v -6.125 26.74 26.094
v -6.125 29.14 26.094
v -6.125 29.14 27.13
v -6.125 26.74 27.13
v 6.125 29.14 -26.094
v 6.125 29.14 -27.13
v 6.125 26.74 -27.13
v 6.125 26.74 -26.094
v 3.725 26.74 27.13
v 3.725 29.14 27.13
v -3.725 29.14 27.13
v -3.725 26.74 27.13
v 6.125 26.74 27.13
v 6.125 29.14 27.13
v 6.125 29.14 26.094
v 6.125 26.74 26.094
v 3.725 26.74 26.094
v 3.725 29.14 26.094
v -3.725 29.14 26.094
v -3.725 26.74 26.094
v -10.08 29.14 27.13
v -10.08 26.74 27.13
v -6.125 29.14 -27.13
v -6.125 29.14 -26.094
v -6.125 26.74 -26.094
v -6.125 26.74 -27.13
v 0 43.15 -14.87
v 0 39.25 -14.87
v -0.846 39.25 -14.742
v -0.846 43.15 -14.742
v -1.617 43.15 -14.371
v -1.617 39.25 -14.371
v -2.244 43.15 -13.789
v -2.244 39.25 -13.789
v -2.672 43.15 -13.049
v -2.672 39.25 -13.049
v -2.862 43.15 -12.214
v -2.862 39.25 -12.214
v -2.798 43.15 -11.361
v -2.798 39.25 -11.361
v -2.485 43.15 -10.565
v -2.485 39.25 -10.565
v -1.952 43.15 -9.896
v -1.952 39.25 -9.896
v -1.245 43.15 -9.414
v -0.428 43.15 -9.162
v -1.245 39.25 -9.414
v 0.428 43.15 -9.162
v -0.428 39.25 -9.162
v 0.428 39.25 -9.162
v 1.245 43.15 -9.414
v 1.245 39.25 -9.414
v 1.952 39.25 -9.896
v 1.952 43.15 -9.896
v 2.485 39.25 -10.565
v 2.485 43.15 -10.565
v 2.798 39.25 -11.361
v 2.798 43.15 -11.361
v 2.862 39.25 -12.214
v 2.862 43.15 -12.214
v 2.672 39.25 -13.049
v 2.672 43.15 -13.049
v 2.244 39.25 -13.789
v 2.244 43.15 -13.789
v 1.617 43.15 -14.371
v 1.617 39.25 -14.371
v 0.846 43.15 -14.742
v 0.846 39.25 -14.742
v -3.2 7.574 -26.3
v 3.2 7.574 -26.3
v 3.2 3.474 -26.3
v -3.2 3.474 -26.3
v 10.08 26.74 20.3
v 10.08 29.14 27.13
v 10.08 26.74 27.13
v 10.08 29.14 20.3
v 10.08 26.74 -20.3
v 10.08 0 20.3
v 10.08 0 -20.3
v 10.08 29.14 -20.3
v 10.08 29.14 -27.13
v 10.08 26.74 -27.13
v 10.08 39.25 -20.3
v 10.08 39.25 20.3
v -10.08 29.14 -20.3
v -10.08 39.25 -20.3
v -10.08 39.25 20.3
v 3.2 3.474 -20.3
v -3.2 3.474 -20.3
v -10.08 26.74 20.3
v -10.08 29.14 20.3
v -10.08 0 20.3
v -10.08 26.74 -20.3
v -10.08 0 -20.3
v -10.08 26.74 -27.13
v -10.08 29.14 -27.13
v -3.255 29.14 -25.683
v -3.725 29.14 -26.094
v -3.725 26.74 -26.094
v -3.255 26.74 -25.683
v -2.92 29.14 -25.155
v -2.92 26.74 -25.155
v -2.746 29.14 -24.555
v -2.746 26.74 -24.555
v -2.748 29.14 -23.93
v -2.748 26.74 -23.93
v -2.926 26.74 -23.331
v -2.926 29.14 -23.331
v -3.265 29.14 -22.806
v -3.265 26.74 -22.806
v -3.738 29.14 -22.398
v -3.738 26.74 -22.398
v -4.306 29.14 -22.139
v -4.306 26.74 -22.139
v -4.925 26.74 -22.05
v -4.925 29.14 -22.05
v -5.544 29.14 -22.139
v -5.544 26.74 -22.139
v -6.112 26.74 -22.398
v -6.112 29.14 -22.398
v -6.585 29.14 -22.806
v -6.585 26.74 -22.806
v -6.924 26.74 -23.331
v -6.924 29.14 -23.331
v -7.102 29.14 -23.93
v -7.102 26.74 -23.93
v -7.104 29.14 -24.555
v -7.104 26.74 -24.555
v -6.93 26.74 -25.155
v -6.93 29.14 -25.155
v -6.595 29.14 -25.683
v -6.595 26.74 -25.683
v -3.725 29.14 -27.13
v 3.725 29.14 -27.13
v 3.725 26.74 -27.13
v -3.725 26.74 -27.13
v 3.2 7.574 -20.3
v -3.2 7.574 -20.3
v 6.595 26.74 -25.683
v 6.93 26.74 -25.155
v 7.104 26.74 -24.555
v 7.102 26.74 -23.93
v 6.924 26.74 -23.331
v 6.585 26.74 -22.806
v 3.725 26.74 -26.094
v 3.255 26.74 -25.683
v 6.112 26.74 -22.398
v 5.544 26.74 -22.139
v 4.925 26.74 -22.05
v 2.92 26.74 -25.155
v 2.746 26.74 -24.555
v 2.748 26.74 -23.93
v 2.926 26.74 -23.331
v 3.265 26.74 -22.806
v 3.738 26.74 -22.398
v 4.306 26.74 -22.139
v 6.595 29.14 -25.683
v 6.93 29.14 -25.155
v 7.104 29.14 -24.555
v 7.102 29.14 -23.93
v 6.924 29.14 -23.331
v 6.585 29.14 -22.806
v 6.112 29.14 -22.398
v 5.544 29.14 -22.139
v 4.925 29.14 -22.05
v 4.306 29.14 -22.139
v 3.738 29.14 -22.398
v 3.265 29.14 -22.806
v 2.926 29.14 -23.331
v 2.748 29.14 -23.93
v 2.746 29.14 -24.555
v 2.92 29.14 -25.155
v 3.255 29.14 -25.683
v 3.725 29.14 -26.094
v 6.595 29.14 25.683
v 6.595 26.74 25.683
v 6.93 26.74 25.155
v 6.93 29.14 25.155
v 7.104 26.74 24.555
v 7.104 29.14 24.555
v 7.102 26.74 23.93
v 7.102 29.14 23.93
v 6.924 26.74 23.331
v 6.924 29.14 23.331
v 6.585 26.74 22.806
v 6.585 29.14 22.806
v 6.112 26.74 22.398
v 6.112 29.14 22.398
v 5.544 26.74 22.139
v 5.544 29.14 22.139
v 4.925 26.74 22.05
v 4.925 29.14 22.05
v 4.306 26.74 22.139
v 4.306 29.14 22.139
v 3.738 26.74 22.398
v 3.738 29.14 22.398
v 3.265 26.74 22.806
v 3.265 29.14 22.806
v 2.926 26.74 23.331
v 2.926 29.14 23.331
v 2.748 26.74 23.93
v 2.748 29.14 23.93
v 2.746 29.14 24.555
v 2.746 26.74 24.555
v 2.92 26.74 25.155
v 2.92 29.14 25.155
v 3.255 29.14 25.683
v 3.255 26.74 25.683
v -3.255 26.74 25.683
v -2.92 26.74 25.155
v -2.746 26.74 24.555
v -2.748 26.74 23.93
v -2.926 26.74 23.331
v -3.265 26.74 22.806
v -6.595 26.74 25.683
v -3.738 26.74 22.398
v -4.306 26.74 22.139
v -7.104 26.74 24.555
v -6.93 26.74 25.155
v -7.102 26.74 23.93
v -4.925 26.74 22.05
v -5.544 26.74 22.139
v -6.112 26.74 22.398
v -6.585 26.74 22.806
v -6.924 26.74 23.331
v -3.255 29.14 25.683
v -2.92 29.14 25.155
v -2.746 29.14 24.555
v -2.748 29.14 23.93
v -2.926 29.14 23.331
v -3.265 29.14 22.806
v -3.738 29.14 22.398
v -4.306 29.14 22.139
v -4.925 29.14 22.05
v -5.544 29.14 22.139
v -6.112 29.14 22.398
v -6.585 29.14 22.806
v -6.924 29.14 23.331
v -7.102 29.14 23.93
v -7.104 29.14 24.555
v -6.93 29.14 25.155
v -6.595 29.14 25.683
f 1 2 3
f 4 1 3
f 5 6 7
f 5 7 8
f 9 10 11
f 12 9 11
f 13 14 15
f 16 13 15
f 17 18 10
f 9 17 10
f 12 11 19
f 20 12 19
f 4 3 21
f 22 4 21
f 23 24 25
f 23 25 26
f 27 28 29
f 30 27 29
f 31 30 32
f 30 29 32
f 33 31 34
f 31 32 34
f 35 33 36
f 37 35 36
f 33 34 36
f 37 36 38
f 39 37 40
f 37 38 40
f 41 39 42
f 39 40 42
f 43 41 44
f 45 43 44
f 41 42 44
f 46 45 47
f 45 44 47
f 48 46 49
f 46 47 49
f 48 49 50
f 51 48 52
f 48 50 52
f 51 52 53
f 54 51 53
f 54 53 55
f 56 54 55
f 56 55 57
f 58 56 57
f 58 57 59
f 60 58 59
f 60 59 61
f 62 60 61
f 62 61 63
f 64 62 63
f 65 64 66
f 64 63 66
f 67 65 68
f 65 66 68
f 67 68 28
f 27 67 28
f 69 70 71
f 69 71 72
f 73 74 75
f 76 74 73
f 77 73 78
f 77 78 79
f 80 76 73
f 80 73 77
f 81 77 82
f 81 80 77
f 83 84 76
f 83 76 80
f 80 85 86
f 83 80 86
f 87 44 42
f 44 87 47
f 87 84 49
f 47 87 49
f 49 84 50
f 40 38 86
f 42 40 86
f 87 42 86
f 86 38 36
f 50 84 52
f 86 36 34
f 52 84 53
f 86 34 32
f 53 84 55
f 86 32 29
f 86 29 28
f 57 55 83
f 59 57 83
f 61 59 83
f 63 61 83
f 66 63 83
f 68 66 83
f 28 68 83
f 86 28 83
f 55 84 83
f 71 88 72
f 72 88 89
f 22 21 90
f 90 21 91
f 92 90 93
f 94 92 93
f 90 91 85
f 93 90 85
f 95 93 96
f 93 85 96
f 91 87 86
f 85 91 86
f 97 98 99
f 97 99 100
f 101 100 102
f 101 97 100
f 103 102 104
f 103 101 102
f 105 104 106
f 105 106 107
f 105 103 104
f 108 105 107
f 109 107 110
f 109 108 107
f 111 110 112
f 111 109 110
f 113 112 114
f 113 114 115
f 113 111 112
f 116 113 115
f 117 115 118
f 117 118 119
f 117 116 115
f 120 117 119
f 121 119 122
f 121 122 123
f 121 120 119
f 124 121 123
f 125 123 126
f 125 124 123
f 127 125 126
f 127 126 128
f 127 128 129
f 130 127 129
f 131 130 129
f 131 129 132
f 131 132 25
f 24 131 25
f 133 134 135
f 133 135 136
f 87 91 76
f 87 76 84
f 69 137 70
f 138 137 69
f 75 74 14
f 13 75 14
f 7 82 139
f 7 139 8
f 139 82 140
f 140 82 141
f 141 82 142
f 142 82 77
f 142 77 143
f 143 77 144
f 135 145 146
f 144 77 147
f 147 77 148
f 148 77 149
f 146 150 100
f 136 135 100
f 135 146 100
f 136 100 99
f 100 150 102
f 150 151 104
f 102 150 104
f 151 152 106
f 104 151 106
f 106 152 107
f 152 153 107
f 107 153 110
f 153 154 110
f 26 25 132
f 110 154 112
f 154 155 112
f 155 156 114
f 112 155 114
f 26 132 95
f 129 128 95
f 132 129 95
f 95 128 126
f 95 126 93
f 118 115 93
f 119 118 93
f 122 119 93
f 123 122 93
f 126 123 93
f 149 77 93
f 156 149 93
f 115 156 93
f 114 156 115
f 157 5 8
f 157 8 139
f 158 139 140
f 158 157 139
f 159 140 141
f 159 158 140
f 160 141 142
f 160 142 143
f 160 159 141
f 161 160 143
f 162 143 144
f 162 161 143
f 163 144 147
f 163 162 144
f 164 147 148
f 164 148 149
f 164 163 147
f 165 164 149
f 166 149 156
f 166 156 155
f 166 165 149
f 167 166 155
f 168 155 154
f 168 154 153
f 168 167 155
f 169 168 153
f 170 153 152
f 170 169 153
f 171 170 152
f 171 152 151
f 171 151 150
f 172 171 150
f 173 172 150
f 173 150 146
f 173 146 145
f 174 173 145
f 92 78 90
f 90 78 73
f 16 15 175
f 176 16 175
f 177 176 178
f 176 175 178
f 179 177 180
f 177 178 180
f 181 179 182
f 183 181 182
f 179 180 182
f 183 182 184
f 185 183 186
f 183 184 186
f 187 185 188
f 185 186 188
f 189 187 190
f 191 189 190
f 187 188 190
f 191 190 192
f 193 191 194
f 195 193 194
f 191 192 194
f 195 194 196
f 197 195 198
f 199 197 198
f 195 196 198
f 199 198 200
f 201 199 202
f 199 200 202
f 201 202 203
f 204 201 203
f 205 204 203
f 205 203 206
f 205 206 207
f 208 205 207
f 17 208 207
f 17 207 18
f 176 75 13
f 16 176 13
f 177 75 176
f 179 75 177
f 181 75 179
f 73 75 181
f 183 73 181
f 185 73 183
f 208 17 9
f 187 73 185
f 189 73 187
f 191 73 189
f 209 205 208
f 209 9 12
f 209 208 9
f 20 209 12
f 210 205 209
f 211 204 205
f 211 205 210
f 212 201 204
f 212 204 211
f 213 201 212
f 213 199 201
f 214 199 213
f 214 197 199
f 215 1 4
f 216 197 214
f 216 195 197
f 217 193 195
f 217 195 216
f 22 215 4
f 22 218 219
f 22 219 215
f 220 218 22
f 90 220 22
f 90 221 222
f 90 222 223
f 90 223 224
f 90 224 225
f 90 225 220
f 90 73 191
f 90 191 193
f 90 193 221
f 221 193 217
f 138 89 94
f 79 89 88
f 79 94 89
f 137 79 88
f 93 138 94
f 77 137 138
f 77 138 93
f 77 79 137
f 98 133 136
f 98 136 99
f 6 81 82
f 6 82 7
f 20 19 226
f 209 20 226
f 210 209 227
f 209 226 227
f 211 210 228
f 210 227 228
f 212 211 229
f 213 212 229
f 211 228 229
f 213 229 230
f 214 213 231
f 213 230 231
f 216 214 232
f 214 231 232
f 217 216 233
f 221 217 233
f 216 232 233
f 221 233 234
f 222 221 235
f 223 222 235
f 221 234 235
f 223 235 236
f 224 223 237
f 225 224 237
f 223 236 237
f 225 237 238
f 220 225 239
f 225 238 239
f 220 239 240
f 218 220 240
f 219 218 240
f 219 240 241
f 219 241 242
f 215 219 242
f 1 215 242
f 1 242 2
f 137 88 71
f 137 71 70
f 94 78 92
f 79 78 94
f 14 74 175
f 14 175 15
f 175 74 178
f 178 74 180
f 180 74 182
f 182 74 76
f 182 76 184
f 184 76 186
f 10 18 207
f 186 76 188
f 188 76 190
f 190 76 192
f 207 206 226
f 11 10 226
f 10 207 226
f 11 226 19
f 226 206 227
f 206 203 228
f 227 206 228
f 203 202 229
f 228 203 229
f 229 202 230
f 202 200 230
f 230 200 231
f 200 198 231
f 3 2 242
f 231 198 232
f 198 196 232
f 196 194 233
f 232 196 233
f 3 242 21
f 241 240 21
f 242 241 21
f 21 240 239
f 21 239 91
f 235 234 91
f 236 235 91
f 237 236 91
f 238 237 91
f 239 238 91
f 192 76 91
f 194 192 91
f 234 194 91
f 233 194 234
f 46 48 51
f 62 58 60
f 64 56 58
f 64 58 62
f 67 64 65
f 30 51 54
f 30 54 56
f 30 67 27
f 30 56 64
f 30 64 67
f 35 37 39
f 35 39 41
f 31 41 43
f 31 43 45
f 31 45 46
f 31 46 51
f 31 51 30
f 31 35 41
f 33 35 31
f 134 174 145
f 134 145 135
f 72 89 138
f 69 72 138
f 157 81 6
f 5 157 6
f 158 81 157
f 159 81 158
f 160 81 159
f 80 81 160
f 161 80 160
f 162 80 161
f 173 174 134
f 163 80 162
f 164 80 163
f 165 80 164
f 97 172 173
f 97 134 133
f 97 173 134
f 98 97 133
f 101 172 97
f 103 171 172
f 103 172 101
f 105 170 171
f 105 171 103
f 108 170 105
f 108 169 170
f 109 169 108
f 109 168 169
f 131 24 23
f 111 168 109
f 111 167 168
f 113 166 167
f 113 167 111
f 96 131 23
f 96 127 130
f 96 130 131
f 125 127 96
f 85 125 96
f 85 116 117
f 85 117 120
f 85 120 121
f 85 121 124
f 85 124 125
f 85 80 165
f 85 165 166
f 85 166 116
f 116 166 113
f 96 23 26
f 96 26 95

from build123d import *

# Parameters (mm, degrees)
SKETCH1_W           = 40.6
SKETCH1_H           = 39.25
BOSS_EXTRUDE1_DEPTH = 10.08
BOSS_EXTRUDE2_DEPTH = 2.4
SKETCH3_W           = 6.4
SKETCH3_H           = 4.1
BOSS_EXTRUDE3_DEPTH = 6
SKETCH4_R           = 2.87
BOSS_EXTRUDE4_DEPTH = 3.9


with BuildPart() as part:
    # Sketch1 → Boss-Extrude1 (new, symmetric)
    with BuildSketch(Plane(origin=(0, 0, 0), x_dir=(0, 0, -1), z_dir=(1, 0, 0))):
        with Locations((0, 19.625)):
            Rectangle(SKETCH1_W, SKETCH1_H)
    extrude(amount=BOSS_EXTRUDE1_DEPTH, both=True)

    # Sketch2 → Boss-Extrude2 (add)
    with BuildSketch(Plane(origin=(0, 29.14, 0), x_dir=(1, 0, 0), z_dir=(0, 1, 0))):
        with BuildLine():
            Line((-10.08, -20.3), (10.08, -20.3))
            Line((10.08, -20.3), (10.08, -27.13))
            Line((10.08, -27.13), (6.124613606, -27.13))
            Line((6.124613606, -27.13), (6.124613606, -26.094160296))
            ThreePointArc((6.124613606, -26.094160296), (4.925, -22.05), (3.725386394, -26.094160296))
            Line((3.725386394, -26.094160296), (3.725386394, -27.13))
            Line((3.725386394, -27.13), (-3.725386394, -27.13))
            Line((-3.725386394, -27.13), (-3.725386394, -26.094160296))
            ThreePointArc((-3.725386394, -26.094160296), (-4.925, -22.05), (-6.124613606, -26.094160296))
            Line((-6.124613606, -26.094160296), (-6.124613606, -27.13))
            Line((-6.124613606, -27.13), (-10.08, -27.13))
            Line((-10.08, -27.13), (-10.08, -20.3))
        make_face()
    boss_extrude2 = extrude(amount=-BOSS_EXTRUDE2_DEPTH)

    # Mirror1: Boss-Extrude2 across plane
    add(boss_extrude2.mirror(Plane.XY))

    # Sketch3 → Boss-Extrude3 (add)
    with BuildSketch(Plane(origin=(0, 0, -20.3), x_dir=(-1, 0, 0), z_dir=(0, 0, -1))):
        with Locations((0, 5.524349408)):
            Rectangle(SKETCH3_W, SKETCH3_H)
    extrude(amount=BOSS_EXTRUDE3_DEPTH)

    # Sketch4 → Boss-Extrude4 (add)
    with BuildSketch(Plane(origin=(0, 39.25, 0), x_dir=(1, 0, 0), z_dir=(0, 1, 0))):
        with Locations(Location((0, 12, 0), (0, 0, 90))):
            Circle(SKETCH4_R)
    extrude(amount=BOSS_EXTRUDE4_DEPTH)


solid = part.part
